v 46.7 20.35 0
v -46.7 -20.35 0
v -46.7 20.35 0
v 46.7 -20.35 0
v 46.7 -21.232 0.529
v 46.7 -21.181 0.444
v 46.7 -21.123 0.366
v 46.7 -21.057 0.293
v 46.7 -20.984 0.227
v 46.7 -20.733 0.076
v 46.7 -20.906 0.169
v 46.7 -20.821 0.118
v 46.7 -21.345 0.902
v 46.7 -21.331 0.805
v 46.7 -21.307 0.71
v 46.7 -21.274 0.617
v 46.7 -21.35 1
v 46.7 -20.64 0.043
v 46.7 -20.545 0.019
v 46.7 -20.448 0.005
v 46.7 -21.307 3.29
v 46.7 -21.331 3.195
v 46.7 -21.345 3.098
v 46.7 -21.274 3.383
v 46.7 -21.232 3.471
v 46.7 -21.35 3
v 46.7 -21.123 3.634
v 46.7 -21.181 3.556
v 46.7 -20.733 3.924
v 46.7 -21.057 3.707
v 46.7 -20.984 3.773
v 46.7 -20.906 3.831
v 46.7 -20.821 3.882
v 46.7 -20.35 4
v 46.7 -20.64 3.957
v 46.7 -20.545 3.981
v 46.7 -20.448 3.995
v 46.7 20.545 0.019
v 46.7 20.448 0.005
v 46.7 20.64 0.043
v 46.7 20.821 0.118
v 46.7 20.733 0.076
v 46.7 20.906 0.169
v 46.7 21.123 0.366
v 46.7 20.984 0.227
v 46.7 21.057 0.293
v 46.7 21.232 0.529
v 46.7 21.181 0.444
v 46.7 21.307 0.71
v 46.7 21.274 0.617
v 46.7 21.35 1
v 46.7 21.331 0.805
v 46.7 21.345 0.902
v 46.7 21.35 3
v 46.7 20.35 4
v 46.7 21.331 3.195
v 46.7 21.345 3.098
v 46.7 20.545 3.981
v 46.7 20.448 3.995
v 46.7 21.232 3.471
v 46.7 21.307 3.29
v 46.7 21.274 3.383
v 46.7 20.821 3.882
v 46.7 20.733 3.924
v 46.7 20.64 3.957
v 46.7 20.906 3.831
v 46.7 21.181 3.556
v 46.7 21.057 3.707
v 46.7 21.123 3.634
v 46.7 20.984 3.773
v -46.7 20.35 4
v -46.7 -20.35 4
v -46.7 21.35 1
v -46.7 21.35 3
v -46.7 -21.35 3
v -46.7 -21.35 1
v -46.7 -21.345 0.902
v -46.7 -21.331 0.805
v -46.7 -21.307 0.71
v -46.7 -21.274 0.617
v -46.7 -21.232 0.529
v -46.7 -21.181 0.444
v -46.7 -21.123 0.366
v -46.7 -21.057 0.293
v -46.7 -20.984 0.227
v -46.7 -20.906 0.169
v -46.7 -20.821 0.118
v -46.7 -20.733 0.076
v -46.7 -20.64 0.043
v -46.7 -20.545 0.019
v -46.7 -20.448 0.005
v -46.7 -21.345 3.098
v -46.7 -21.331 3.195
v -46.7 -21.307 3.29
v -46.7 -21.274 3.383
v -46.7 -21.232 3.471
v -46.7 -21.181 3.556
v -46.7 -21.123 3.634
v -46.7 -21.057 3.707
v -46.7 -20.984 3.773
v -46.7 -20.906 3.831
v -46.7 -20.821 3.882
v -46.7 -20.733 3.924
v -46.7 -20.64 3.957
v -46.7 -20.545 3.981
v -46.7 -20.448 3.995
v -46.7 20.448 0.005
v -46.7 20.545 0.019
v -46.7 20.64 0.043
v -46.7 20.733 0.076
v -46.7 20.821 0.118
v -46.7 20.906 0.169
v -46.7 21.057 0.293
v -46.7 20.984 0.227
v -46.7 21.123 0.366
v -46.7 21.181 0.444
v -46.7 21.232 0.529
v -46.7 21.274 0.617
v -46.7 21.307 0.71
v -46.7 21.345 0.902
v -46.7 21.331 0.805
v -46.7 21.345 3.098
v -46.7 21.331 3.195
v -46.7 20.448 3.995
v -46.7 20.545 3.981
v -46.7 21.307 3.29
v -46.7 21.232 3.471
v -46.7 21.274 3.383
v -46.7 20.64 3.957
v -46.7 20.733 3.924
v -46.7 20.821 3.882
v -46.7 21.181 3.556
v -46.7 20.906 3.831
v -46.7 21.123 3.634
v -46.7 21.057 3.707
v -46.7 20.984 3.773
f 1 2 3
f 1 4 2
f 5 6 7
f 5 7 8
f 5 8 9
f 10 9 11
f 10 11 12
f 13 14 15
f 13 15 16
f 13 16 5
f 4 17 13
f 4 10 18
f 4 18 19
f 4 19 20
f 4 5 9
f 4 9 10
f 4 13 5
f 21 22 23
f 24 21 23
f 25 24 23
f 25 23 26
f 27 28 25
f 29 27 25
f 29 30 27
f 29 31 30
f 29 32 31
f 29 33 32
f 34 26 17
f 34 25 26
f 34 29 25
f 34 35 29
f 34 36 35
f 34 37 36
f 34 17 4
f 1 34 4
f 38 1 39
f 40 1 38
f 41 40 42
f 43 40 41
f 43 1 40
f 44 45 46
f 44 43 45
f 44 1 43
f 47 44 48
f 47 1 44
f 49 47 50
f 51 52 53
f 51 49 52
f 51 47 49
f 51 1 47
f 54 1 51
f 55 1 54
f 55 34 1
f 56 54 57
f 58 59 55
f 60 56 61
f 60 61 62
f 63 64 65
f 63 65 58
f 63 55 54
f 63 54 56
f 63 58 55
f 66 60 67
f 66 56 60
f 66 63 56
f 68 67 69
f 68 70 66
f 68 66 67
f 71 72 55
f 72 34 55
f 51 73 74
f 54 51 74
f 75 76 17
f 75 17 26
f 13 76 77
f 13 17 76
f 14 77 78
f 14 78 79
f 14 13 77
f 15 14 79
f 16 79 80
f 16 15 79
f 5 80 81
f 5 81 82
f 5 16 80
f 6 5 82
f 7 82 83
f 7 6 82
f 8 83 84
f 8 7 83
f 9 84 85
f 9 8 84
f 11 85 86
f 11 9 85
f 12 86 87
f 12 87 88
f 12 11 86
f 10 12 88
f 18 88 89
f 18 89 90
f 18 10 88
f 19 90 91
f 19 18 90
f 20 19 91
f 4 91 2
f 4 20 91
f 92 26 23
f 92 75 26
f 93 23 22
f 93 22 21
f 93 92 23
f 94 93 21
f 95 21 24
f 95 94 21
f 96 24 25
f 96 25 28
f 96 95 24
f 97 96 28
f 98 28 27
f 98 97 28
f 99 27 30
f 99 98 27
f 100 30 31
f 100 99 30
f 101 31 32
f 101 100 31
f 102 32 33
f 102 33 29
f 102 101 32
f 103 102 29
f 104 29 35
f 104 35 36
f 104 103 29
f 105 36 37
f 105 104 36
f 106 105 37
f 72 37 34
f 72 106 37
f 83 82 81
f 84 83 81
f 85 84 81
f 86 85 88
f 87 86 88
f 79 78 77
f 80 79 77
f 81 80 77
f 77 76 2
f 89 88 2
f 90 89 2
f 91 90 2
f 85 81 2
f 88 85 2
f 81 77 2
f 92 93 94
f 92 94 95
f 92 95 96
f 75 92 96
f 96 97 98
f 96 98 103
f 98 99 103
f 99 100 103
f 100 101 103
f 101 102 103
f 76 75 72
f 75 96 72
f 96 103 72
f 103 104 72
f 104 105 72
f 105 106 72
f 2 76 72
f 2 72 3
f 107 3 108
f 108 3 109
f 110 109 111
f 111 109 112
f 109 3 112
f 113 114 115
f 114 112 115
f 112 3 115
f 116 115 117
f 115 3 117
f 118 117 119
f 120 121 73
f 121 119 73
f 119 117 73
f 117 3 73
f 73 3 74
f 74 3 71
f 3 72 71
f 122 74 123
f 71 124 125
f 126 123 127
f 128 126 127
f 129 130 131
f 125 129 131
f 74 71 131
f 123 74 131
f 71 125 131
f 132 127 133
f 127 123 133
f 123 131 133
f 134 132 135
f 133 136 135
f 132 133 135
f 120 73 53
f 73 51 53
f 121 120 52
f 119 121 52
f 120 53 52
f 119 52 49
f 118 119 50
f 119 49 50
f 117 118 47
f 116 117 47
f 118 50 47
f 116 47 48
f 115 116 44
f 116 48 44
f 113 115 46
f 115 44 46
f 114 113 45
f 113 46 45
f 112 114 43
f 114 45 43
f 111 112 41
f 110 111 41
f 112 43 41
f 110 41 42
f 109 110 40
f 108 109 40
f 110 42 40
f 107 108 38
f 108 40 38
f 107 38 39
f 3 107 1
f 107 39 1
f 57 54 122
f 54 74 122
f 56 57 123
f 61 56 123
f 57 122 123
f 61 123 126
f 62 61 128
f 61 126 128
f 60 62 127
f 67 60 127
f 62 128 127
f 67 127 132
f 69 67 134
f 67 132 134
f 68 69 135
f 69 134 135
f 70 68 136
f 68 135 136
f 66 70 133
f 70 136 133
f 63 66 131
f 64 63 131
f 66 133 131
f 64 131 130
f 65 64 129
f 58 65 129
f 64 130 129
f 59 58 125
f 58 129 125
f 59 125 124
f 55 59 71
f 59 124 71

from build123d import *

# Parameters (mm, degrees)
SKETCH_W  = 42.7
SKETCH_H  = 4
PAD_DEPTH = 46.7
FILLET_R  = 1


with BuildPart() as part:
    # Sketch → Pad (new body, symmetric)
    with BuildSketch(Plane.YZ):
        with Locations((0, 2)):
            Rectangle(SKETCH_W, SKETCH_H)
    extrude(amount=PAD_DEPTH, both=True)

    # Fillet
    fillet_edges = [part.edges().sort_by_distance(p)[0] for p in [
        (0, -21.35, 4),
        (0, -21.35, 0),
        (0, 21.35, 0),
        (0, 21.35, 4),
    ]]
    fillet(fillet_edges, radius=FILLET_R)


solid = part.part
